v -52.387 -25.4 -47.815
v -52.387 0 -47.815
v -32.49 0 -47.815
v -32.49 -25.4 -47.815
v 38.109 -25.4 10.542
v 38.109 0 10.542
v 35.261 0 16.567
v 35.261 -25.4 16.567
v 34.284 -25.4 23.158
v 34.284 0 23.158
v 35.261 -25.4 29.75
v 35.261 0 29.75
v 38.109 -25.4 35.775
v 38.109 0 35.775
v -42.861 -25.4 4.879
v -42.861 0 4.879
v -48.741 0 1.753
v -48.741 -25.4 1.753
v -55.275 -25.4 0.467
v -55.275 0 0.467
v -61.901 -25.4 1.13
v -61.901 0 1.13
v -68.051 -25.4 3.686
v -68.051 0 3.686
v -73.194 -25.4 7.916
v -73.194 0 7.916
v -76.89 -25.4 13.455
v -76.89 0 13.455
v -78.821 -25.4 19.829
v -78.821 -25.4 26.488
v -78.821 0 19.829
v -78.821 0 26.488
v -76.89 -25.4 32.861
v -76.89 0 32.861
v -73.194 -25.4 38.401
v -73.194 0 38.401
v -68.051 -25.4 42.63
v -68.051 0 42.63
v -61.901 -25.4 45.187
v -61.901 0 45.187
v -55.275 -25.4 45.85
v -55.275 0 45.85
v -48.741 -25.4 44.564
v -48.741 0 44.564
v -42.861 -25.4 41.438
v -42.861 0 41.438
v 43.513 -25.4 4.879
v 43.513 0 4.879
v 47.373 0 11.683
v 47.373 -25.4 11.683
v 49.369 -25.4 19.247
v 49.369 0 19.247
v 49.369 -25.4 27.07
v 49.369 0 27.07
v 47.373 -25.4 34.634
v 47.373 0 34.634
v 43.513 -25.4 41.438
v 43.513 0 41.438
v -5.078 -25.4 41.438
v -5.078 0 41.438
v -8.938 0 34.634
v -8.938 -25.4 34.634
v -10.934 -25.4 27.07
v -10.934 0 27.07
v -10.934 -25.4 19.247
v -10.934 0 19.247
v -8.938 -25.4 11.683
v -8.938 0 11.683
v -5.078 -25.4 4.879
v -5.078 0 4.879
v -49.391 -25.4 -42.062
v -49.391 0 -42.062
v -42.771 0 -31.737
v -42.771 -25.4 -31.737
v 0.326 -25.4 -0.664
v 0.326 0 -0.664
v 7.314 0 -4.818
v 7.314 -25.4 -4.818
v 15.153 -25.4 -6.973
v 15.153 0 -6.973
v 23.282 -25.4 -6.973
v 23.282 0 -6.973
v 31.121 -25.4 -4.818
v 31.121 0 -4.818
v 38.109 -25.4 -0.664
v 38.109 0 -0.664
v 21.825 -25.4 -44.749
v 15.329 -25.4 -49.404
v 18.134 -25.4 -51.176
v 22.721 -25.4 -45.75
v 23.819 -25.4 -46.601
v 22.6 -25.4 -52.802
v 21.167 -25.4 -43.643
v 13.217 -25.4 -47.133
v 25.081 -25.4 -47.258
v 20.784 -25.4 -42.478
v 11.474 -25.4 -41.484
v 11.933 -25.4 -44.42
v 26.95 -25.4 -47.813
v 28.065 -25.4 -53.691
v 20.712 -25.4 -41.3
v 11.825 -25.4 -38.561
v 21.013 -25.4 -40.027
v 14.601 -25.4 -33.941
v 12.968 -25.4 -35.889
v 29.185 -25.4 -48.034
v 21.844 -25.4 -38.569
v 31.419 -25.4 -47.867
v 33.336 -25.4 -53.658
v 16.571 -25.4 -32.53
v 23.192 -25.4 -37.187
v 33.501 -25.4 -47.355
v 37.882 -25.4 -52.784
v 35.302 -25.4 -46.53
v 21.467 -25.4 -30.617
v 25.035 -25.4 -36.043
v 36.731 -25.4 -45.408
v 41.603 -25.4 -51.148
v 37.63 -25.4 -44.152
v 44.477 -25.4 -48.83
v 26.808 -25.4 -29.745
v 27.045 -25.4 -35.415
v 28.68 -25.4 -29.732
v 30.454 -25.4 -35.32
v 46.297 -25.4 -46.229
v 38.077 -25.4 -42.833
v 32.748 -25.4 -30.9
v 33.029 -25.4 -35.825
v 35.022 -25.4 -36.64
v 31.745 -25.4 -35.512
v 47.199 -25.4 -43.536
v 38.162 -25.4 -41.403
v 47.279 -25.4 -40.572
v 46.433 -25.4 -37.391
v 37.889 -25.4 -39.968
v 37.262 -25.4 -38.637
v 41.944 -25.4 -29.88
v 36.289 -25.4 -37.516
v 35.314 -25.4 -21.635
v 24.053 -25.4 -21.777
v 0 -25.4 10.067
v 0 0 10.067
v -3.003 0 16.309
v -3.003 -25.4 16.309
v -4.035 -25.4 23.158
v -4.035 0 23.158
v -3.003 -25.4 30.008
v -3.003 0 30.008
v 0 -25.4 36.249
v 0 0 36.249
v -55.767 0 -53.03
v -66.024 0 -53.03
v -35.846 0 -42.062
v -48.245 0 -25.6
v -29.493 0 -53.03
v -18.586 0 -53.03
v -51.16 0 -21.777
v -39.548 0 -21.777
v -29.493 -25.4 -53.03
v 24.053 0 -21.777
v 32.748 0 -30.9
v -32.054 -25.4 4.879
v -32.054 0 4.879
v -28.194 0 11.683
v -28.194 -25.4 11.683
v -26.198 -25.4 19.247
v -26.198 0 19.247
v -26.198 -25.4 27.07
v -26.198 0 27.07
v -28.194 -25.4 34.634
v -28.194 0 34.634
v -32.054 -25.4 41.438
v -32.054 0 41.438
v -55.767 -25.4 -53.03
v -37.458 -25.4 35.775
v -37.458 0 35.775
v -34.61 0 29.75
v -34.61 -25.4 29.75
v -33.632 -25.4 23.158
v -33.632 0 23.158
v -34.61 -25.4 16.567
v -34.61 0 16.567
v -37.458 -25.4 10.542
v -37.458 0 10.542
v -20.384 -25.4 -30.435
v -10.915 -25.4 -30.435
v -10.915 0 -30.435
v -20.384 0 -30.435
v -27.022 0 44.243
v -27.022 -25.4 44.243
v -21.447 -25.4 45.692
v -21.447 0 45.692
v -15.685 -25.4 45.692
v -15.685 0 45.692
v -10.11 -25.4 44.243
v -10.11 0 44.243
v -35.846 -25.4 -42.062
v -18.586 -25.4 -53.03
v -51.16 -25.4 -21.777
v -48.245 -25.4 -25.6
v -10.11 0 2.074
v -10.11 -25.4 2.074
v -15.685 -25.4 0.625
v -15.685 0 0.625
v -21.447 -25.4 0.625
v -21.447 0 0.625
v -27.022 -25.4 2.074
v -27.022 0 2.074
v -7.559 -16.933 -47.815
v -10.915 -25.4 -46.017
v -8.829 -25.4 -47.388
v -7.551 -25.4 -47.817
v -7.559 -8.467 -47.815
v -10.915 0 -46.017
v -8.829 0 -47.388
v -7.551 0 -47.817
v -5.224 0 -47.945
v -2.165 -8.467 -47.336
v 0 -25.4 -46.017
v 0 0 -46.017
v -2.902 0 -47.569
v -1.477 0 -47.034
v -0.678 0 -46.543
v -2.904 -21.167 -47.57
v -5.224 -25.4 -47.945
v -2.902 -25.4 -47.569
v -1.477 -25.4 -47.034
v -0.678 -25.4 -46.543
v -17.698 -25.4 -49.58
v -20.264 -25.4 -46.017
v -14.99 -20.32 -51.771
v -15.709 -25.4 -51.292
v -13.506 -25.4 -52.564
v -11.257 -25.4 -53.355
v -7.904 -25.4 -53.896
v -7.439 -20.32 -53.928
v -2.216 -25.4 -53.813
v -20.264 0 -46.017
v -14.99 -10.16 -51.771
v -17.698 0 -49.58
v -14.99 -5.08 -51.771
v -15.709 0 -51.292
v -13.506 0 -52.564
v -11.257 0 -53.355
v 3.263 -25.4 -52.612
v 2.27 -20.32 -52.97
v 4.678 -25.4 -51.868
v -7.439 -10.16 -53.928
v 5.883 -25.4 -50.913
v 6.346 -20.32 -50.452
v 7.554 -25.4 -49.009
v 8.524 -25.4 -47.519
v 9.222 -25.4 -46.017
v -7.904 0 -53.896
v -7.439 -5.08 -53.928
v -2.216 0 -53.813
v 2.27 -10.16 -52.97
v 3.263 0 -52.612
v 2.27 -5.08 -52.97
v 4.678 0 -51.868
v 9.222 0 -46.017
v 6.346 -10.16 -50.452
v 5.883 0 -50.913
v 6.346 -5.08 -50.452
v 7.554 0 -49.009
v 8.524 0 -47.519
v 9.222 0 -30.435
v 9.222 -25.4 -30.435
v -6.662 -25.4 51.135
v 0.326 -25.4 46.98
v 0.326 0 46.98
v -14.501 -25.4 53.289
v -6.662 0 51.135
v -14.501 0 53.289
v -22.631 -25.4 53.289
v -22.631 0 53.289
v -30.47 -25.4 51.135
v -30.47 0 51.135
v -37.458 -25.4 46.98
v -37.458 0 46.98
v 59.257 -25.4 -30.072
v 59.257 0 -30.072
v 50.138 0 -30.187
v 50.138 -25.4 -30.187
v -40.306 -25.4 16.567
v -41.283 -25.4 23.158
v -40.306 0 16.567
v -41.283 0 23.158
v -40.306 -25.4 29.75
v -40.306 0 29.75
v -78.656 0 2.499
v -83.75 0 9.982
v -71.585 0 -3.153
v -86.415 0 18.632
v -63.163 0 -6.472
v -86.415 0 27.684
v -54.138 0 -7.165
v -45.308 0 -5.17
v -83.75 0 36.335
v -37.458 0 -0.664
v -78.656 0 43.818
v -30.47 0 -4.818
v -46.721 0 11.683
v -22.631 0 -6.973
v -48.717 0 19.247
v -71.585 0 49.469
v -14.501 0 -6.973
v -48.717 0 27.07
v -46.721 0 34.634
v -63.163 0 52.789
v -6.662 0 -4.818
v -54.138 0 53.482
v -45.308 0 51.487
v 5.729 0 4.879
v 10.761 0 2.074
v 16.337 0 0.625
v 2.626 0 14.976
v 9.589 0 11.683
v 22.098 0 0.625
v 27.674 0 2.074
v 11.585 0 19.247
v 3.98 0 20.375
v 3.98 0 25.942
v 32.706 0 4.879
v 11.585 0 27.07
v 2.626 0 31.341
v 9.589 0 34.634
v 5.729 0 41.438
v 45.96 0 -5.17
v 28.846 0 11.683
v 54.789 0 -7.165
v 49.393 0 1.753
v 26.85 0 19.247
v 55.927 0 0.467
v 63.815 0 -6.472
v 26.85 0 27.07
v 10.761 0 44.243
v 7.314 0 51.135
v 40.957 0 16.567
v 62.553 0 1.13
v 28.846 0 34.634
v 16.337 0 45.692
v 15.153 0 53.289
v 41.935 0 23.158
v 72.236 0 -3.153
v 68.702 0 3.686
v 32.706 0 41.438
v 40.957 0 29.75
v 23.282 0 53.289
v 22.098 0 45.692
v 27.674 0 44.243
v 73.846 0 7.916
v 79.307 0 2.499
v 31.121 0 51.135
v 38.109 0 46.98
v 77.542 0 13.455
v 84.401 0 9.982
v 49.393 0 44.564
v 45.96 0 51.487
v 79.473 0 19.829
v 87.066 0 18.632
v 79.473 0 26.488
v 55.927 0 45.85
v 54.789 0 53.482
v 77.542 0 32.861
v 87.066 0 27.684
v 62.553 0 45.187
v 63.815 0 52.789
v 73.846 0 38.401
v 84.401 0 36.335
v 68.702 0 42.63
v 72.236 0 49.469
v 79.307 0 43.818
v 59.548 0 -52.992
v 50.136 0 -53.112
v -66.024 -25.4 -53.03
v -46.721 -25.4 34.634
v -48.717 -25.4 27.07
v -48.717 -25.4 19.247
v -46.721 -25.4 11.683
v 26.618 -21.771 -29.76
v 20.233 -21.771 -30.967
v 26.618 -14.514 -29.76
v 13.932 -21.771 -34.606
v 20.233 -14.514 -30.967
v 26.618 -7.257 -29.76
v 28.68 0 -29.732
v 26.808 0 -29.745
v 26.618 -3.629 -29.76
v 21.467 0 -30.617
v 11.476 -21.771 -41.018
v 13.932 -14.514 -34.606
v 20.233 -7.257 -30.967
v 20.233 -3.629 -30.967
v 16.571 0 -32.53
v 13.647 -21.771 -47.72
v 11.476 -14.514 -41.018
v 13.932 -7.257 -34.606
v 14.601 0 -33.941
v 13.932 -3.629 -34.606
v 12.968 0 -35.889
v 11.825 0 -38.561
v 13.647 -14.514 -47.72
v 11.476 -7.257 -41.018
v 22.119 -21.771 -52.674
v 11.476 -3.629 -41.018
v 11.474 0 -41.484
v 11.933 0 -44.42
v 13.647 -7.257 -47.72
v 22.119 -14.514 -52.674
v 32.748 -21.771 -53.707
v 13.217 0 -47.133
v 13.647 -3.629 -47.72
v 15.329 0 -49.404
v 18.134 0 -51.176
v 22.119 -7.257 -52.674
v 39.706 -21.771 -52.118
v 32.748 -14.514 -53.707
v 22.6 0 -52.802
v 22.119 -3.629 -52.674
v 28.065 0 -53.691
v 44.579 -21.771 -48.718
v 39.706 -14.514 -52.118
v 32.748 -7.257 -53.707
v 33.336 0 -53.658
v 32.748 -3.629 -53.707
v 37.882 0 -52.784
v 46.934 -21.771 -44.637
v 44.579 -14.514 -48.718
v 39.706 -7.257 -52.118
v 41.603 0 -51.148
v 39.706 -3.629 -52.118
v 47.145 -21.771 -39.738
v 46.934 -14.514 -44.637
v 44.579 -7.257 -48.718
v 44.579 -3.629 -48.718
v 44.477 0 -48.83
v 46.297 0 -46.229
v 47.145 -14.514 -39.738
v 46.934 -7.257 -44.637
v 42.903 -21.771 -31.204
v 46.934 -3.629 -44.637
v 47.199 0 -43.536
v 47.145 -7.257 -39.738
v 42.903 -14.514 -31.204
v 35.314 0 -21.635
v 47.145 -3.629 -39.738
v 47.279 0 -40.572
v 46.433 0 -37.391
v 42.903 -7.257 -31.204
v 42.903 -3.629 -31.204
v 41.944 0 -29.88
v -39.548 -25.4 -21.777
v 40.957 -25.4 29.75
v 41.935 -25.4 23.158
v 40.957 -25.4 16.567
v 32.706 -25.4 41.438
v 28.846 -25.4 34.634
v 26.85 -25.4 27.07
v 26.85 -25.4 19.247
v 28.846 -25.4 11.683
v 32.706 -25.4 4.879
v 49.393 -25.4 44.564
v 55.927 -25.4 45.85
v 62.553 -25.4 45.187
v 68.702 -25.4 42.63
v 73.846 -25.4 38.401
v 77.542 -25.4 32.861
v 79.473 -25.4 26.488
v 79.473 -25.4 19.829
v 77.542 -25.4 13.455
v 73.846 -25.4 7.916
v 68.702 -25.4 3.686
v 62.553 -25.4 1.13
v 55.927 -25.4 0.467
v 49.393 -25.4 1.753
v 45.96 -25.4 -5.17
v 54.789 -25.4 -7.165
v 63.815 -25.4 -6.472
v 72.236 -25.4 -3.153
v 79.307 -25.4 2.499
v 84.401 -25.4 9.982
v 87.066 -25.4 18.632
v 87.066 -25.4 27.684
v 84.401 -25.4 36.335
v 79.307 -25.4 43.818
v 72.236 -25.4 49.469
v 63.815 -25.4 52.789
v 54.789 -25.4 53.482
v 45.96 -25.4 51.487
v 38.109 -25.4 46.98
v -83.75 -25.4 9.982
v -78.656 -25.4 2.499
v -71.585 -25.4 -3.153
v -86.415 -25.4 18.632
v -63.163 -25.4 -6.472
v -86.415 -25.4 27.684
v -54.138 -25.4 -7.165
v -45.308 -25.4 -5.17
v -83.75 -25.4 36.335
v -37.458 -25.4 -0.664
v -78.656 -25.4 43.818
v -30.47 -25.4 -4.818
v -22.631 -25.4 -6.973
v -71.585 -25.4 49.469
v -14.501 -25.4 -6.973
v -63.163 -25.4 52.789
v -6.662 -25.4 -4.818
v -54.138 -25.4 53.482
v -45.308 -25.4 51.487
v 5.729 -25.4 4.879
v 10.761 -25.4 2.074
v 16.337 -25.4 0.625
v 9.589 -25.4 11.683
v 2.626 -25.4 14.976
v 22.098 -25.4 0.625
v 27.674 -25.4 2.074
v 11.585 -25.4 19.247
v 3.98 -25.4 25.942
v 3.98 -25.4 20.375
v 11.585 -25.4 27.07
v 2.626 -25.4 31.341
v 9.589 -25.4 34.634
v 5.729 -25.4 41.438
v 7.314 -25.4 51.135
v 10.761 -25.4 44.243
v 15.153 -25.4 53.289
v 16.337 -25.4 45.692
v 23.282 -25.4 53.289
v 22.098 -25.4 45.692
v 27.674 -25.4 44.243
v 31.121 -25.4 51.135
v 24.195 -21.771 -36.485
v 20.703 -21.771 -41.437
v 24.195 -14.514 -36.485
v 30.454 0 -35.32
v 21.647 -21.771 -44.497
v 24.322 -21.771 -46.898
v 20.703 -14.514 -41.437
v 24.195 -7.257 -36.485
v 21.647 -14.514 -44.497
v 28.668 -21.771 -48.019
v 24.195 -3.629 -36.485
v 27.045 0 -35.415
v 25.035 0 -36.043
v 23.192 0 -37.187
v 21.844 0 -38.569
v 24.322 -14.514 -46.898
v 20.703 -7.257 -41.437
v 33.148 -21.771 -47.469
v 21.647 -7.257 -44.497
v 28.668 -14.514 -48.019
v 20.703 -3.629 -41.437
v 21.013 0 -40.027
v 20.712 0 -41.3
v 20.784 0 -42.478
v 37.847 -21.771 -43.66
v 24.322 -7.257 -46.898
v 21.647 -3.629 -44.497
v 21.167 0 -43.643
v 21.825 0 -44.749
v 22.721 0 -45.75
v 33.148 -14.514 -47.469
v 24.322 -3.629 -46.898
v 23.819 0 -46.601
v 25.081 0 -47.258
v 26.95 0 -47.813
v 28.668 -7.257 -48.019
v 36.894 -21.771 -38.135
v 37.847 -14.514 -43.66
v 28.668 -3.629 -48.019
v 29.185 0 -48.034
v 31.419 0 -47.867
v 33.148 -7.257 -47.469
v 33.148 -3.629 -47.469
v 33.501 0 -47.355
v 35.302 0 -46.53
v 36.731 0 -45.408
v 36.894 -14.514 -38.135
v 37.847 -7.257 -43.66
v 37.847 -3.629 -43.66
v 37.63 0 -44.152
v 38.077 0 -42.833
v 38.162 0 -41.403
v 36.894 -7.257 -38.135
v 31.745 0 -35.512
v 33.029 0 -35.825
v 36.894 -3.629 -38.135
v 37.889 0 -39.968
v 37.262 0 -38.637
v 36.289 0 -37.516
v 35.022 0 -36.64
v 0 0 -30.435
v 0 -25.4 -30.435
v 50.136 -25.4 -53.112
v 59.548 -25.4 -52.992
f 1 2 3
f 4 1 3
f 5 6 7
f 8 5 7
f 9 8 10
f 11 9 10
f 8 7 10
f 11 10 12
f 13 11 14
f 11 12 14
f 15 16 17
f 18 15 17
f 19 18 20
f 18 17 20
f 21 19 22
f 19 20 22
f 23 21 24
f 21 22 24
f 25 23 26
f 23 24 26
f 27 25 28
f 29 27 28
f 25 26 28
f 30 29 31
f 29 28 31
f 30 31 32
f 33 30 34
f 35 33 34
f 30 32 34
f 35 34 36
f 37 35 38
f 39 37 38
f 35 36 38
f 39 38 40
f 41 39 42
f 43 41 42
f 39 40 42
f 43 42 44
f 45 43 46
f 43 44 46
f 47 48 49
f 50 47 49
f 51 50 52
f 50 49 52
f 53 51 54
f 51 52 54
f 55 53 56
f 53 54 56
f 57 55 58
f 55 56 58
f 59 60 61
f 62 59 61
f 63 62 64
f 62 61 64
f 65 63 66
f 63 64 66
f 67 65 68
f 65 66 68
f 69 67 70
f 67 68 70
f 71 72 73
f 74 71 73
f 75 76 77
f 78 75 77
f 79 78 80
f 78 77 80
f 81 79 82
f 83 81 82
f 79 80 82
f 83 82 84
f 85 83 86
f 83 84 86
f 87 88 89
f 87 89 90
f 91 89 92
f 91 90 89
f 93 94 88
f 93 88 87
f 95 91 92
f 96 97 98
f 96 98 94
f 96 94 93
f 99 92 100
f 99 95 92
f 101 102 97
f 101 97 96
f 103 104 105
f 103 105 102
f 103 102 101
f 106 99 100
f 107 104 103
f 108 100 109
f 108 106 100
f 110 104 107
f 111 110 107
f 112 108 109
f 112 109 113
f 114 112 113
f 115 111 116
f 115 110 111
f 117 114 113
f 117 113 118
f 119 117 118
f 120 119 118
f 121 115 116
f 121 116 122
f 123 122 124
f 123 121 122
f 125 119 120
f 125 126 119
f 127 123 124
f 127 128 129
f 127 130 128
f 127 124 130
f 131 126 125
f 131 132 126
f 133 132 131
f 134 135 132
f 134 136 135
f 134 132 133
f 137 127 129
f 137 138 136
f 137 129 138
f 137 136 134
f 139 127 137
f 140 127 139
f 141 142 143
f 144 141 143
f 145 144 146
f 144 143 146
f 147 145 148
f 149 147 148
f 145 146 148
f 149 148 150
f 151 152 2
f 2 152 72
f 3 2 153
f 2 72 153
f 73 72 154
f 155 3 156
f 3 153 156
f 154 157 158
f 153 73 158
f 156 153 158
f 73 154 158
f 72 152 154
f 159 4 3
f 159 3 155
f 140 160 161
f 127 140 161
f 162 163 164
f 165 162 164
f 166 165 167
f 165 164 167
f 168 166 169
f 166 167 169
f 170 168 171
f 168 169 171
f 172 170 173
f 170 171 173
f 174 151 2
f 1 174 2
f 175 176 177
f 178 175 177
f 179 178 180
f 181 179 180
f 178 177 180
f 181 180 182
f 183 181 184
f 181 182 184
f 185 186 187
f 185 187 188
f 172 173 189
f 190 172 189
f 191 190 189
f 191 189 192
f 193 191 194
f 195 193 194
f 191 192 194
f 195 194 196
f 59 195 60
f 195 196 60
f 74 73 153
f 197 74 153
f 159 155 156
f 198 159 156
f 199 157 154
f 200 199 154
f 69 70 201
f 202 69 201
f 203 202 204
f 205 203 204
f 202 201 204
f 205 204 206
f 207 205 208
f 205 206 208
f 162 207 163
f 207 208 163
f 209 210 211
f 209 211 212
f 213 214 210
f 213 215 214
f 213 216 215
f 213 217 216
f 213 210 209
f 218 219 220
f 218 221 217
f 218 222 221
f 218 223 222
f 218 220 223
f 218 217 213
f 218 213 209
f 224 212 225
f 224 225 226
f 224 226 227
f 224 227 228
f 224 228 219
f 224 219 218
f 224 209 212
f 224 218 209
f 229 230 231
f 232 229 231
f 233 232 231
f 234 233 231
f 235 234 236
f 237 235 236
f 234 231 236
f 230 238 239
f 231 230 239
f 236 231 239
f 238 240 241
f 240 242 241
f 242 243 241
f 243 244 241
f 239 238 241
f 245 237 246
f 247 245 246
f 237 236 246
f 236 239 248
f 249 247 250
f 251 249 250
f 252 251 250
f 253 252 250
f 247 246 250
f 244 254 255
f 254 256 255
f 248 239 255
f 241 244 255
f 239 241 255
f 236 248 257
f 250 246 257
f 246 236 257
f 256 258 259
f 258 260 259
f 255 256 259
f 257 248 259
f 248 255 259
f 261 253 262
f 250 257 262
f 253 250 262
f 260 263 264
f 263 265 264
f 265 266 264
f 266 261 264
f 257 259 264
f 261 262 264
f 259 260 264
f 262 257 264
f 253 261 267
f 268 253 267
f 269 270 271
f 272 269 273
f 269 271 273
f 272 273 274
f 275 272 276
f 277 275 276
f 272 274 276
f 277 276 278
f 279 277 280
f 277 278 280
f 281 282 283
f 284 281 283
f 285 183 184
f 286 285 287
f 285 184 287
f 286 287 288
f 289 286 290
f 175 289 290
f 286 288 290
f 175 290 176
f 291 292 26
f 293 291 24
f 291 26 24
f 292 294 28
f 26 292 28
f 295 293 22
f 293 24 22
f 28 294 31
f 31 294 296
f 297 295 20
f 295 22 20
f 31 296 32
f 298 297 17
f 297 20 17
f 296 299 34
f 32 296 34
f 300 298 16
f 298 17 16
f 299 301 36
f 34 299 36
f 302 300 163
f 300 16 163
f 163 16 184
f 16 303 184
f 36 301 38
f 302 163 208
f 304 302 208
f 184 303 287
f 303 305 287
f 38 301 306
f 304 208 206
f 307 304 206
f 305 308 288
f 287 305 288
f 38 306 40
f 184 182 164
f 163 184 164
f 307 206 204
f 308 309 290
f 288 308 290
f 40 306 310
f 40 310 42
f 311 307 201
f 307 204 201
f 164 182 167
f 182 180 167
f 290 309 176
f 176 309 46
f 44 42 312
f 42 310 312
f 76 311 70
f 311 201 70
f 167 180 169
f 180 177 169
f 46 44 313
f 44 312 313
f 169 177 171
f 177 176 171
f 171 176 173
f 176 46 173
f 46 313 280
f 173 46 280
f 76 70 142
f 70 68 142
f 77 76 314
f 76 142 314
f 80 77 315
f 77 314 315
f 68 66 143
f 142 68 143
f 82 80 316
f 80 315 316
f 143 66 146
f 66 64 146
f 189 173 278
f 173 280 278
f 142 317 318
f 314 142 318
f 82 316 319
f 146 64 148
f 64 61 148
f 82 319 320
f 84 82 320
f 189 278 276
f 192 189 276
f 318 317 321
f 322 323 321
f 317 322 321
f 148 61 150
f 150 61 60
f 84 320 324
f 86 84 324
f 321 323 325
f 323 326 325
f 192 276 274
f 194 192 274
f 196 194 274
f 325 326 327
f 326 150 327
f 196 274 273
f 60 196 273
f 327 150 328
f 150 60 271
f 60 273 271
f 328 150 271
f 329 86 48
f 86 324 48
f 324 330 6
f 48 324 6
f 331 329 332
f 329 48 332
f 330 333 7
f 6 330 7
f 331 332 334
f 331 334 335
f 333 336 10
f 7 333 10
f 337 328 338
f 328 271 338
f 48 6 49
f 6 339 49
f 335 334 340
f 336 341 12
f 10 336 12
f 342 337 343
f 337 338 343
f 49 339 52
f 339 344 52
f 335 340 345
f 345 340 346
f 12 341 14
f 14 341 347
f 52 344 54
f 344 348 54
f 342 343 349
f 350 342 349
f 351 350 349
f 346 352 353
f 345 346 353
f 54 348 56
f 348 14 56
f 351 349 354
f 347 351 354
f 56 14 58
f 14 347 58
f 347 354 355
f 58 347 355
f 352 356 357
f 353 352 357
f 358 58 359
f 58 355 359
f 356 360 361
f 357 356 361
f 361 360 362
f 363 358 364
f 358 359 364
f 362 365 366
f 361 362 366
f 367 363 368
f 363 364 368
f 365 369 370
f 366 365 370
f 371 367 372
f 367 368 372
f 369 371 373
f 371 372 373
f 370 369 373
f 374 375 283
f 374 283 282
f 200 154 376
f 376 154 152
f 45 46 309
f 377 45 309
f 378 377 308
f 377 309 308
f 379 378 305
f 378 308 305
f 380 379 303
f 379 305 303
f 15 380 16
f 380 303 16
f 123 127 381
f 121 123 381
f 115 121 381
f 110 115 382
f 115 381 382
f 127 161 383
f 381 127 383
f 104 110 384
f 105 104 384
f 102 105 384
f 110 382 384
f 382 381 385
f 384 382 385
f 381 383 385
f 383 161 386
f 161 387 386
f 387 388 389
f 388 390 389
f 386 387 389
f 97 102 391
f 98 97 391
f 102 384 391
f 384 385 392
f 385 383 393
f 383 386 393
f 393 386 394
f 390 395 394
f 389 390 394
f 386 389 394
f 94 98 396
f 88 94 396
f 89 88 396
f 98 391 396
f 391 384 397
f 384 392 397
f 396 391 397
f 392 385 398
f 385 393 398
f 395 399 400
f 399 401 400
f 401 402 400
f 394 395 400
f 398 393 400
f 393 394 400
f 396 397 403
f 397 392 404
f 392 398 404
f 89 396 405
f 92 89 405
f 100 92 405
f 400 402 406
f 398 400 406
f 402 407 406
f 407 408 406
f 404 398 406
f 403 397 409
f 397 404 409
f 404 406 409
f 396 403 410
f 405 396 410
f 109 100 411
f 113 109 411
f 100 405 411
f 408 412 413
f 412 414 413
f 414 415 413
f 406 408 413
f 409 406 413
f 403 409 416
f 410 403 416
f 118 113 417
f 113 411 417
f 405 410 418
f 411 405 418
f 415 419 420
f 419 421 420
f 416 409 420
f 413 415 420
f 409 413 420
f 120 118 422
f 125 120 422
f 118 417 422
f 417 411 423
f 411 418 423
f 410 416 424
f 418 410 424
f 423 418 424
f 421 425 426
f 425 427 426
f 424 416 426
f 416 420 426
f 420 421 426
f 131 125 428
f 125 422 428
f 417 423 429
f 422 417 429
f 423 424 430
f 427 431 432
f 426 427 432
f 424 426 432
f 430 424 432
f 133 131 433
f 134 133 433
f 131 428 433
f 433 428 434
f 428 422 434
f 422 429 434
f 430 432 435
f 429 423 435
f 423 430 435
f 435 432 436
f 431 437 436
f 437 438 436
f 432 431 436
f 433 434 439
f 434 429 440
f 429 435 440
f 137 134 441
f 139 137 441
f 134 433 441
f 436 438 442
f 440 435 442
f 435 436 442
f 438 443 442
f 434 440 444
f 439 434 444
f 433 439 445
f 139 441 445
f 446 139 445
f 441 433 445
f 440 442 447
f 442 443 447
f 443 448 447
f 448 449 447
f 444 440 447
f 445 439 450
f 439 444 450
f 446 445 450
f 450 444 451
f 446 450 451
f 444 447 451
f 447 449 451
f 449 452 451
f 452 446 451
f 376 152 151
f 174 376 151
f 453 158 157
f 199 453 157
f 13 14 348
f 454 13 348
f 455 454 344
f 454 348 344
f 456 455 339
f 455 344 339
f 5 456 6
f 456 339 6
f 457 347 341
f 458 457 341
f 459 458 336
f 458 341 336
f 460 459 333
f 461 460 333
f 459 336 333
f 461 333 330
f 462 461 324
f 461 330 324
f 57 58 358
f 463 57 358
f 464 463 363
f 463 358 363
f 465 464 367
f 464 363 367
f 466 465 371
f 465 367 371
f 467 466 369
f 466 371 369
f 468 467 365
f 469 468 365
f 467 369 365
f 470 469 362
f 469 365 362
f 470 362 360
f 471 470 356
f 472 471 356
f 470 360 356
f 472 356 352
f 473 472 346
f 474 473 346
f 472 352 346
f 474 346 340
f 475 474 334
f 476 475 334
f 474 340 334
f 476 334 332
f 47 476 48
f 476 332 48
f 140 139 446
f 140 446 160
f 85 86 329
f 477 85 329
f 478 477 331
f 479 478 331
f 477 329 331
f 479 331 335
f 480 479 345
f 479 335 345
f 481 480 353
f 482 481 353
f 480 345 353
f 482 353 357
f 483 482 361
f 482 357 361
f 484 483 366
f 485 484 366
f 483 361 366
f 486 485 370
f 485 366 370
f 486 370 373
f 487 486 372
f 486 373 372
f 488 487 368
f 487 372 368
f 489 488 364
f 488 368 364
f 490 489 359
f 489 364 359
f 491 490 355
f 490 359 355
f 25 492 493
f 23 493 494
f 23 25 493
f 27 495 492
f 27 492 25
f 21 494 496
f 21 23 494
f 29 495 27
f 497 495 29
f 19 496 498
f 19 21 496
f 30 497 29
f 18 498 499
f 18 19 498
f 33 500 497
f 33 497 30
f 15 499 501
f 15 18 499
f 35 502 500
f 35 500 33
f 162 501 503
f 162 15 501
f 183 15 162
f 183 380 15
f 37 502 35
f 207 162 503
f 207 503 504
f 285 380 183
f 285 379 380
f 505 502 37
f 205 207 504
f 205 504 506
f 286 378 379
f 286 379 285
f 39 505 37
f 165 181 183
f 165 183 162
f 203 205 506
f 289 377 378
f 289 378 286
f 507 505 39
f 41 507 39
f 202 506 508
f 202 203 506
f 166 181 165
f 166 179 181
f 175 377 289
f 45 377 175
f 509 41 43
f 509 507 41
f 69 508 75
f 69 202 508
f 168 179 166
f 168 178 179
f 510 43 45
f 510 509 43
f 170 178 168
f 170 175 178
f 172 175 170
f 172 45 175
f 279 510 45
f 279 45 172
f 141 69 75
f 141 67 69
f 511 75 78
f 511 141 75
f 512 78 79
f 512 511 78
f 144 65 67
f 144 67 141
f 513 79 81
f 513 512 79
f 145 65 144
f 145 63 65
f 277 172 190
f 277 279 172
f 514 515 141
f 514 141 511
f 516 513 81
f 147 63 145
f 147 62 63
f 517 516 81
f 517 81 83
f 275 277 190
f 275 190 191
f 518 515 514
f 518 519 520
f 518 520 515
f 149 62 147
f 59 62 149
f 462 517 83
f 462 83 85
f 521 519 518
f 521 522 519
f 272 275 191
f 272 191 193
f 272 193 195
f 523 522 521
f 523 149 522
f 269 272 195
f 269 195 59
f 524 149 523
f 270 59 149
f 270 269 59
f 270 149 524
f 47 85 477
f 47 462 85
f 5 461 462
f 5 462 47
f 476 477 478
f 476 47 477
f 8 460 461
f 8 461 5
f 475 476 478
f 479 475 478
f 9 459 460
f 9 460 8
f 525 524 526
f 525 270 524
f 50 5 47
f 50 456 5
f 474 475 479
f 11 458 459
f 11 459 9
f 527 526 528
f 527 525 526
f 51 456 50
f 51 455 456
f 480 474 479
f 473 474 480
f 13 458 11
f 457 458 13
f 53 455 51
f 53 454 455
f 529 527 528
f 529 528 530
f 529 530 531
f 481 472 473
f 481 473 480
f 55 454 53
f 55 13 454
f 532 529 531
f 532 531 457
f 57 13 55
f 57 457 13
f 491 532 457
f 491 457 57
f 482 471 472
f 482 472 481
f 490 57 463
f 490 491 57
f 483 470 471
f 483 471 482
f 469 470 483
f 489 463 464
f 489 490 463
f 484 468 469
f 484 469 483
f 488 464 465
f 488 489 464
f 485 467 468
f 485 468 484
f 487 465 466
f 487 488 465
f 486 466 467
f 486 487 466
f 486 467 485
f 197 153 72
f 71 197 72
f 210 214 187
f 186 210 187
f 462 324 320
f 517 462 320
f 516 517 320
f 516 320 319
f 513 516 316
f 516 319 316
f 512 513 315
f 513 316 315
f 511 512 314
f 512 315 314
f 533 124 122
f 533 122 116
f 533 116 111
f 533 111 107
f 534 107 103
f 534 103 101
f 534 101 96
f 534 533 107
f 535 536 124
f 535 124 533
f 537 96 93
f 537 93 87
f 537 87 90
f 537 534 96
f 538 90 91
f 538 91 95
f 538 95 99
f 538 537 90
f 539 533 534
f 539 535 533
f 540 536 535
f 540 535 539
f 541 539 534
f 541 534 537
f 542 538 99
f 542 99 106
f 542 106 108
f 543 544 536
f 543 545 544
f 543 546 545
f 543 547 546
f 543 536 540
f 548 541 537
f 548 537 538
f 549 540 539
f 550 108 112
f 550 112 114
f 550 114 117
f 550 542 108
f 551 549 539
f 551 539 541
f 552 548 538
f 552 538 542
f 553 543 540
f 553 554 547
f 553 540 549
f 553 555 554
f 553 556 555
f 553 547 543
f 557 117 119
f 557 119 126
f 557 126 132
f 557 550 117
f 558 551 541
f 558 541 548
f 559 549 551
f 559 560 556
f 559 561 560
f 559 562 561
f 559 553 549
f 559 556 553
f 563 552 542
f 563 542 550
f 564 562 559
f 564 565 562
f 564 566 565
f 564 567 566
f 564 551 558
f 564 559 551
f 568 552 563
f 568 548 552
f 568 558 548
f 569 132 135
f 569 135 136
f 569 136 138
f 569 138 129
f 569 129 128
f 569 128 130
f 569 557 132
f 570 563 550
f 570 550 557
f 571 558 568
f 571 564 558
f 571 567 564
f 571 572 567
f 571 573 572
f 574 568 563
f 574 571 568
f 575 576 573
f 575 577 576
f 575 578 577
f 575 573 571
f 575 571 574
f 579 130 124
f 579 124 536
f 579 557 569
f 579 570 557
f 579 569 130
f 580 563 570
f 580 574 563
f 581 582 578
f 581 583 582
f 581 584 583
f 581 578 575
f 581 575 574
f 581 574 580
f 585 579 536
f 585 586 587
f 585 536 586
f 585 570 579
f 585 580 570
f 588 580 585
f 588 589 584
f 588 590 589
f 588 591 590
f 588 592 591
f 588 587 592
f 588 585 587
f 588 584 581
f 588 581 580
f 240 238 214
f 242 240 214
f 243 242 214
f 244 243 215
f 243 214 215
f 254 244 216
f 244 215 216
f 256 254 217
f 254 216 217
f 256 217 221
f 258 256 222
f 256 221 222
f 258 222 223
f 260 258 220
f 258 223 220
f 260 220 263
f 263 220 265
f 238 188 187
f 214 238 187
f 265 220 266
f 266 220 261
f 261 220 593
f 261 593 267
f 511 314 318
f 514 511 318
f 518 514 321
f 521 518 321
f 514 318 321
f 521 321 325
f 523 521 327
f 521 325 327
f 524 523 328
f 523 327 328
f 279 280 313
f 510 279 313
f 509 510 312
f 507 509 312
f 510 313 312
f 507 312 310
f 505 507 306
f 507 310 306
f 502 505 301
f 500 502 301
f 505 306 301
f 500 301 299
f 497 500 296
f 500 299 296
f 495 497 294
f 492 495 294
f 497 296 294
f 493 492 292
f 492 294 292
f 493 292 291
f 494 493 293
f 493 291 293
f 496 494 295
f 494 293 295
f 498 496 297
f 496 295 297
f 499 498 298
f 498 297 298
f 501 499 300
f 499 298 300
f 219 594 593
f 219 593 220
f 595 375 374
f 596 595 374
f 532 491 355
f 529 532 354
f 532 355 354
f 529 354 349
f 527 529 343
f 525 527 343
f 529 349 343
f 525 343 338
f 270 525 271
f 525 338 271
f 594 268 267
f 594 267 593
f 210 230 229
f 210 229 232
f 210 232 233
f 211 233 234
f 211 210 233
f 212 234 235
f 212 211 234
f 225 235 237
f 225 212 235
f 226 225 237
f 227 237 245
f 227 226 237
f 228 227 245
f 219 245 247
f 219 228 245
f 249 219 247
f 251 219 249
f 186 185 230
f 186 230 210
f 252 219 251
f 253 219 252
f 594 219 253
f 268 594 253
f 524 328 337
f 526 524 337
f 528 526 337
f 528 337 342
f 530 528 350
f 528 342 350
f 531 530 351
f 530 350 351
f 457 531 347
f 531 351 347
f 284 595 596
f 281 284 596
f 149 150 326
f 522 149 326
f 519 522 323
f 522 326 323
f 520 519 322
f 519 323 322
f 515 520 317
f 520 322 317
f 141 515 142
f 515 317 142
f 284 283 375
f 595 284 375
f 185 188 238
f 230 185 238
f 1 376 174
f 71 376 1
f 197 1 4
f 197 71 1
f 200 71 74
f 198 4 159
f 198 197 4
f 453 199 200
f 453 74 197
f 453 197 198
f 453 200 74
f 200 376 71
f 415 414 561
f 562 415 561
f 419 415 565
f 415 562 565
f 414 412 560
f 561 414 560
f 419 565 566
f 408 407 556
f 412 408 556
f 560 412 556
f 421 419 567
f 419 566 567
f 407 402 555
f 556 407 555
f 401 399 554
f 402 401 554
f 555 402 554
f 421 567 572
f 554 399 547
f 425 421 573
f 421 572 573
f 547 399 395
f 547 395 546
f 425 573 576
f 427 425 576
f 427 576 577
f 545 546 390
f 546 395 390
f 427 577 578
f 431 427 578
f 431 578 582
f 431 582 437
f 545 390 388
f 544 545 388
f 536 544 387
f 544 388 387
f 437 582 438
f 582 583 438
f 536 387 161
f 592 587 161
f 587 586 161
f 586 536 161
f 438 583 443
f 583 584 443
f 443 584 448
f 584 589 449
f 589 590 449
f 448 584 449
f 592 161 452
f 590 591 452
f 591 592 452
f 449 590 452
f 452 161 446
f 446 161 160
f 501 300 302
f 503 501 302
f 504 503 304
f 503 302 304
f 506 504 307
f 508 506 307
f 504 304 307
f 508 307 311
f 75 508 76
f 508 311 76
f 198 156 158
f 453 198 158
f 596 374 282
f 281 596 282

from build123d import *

# Parameters (mm, degrees)
F1_DEPTH = 25.4


with BuildPart() as f1:
    # F0 (on Front) → F1 (new body)
    with BuildSketch(Plane.XZ):
        with BuildLine():
            ThreePointArc((0.3257377115, 46.9804664932), (-18.5660072885, 53.5621488049), (-37.4577522885, 46.9804664932))
            ThreePointArc((-37.4577522885, 46.9804664932), (-86.7533174857, 23.1583286077), (-37.4577522885, -0.6638092779))
            ThreePointArc((-37.4577522885, -0.6638092779), (-18.5660072885, -7.2454915895), (0.3257377115, -0.6638092779))
            ThreePointArc((0.3257377115, -0.6638092779), (19.2174827115, -7.2454915895), (38.1092277115, -0.6638092779))
            ThreePointArc((38.1092277115, -0.6638092779), (87.4047929087, 23.1583286077), (38.1092277115, 46.9804664932))
            ThreePointArc((38.1092277115, 46.9804664932), (19.2174827115, 53.5621488049), (0.3257377115, 46.9804664932))
        make_face()
        with BuildLine():
            ThreePointArc((-42.8612110868, 4.8789589528), (-79.0666542328, 23.1583286077), (-42.8612110868, 41.4376982625))
            ThreePointArc((-42.8612110868, 41.4376982625), (-48.9698274857, 23.1583286077), (-42.8612110868, 4.8789589528))
        make_face(mode=Mode.SUBTRACT)
        with BuildLine():
            ThreePointArc((-37.4577522885, 10.5420220764), (-41.2831642328, 23.1583286077), (-37.4577522885, 35.7746351389))
            ThreePointArc((-37.4577522885, 35.7746351389), (-33.6323403441, 23.1583286077), (-37.4577522885, 10.5420220764))
        make_face(mode=Mode.SUBTRACT)
        with BuildLine():
            ThreePointArc((-32.0542934901, 41.4376982625), (-18.5660072885, 45.875485552), (-5.0777210868, 41.4376982625))
            ThreePointArc((-5.0777210868, 41.4376982625), (-11.1863374857, 23.1583286077), (-5.0777210868, 4.8789589528))
            ThreePointArc((-5.0777210868, 4.8789589528), (-18.5660072885, 0.4411716633), (-32.0542934901, 4.8789589528))
            ThreePointArc((-32.0542934901, 4.8789589528), (-25.9456770913, 23.1583286077), (-32.0542934901, 41.4376982625))
        make_face(mode=Mode.SUBTRACT)
        with BuildLine():
            ThreePointArc((0, 36.2492641357), (4.1511496559, 23.1583286077), (0, 10.0673930796))
            ThreePointArc((0, 10.0673930796), (-4.0351350931, 23.1583286077), (0, 36.2492641357))
        make_face(mode=Mode.SUBTRACT)
        with BuildLine():
            ThreePointArc((5.7291965099, 41.4376982625), (19.2174827115, 45.875485552), (32.7057689132, 41.4376982625))
            ThreePointArc((32.7057689132, 41.4376982625), (26.5971525143, 23.1583286077), (32.7057689132, 4.8789589528))
            ThreePointArc((32.7057689132, 4.8789589528), (19.2174827115, 0.4411716633), (5.7291965099, 4.8789589528))
            ThreePointArc((5.7291965099, 4.8789589528), (11.8378129087, 23.1583286077), (5.7291965099, 41.4376982625))
        make_face(mode=Mode.SUBTRACT)
        with BuildLine():
            ThreePointArc((38.1092277115, 10.5420220764), (34.2838157672, 23.1583286077), (38.1092277115, 35.7746351389))
            ThreePointArc((38.1092277115, 35.7746351389), (41.9346396559, 23.1583286077), (38.1092277115, 10.5420220764))
        make_face(mode=Mode.SUBTRACT)
        with BuildLine():
            ThreePointArc((43.5126865099, 41.4376982625), (79.7181296559, 23.1583286077), (43.5126865099, 4.8789589528))
            ThreePointArc((43.5126865099, 4.8789589528), (49.6213029087, 23.1583286077), (43.5126865099, 41.4376982625))
        make_face(mode=Mode.SUBTRACT)
    extrude(amount=F1_DEPTH)


with BuildPart() as f1b:
    # F0 (on Front) → F1, piece 2 (new body)
    with BuildSketch(Plane.XZ):
        Polygon((-48.2449345291, -25.6000366062), (-66.0236254334, -53.0300103128), (-55.7671576112, -53.0300103128), (-52.3873344064, -47.8154271841), (-32.4900448322, -47.8154271841), (-29.4934660196, -53.0300103128), (-18.5859147459, -53.0300103128), (-39.5482927561, -21.7774584889), (-51.1598773301, -21.7774584889), align=None)
        Polygon((-35.8462147415, -42.0619919896), (-49.3907555938, -42.0619919896), (-42.7714564835, -31.7372341625), align=None, mode=Mode.SUBTRACT)
    extrude(amount=F1_DEPTH)


with BuildPart() as f1c:
    # F0 (on Front) → F1, piece 3 (new body)
    with BuildSketch(Plane.XZ):
        with BuildLine():
            Line((-10.9146703035, -30.4352641106), (-20.3838627785, -30.4352641106))
            Line((-20.3838627785, -30.4352641106), (-20.2639997005, -46.0174791515))
            add(Edge.make_bspline(
                [(-20.2639997005, -46.0174791515), (-19.078476388, -48.3510011859), (-15.2422867149, -52.4994844607), (-7.6505096386, -54.4486724465), (2.4232218284, -53.5168061714), (6.4286154935, -50.8196755354), (8.6860112316, -47.5204543574), (9.222346358, -46.0174791515)],
                knots=[0, 0, 0, 0, 0.2115271615, 0.4237122791, 0.6602068488, 0.825917741, 1, 1, 1, 1], degree=3))
            Line((9.222346358, -46.0174791515), (9.222346358, -30.4352641106))
            Line((9.222346358, -30.4352641106), (0, -30.4352641106))
            Line((0, -30.4352641106), (0, -46.0174791515))
            add(Edge.make_bspline(
                [(-10.9146703035, -46.0174791515), (-9.9383207167, -46.7689096849), (-7.7975948287, -48.4164822528), (-2.0428292679, -47.6669488752), (-0.5901281845, -46.4939744655), (0, -46.0174791515)],
                knots=[0, 0, 0, 0, 0.3323932812, 0.7287993067, 1, 1, 1, 1], degree=3))
            Line((-10.9146703035, -46.0174791515), (-10.9146703035, -30.4352641106))
        make_face()
    extrude(amount=F1_DEPTH)


with BuildPart() as f1d:
    # F0 (on Front) → F1, piece 4 (new body)
    with BuildSketch(Plane.XZ):
        with BuildLine():
            Line((24.052741006, -21.7774640769), (32.7478125691, -30.900163576))
            add(Edge.make_bspline(
                [(32.7478125691, -30.900163576), (29.7426497286, -29.7553391025), (27.5330072276, -29.3114611204), (11.0097216276, -32.1368400019), (10.3567760076, -51.0689860547), (33.0869741502, -55.5707344255), (45.4438933537, -49.9808832635), (49.5245949416, -38.4775955078), (40.8401708539, -28.3088108065), (35.3135690093, -21.6349232942)],
                knots=[0, 0, 0, 0, 0.0976588054, 0.2417933981, 0.3834470786, 0.5584355319, 0.6985849896, 0.8181138879, 1, 1, 1, 1], degree=3))
            Line((35.3135690093, -21.6349232942), (24.052741006, -21.7774640769))
        make_face()
        with BuildLine():
            add(Edge.make_bspline(
                [(30.4536372423, -35.3195555508), (28.1638773212, -35.0780844827), (24.0002699023, -35.6530041008), (19.1534906663, -41.3936427557), (23.8659539627, -48.2586824853), (33.3069252679, -48.3362956842), (38.8479249763, -44.2326893943), (37.7957037247, -37.1666525845), (32.8597627783, -35.5732981803), (30.4536372423, -35.3195555508)],
                knots=[0, 0, 0, 0, 0.1401966738, 0.2769844468, 0.419206197, 0.5844560915, 0.7211198069, 0.8526785303, 1, 1, 1, 1], degree=3))
        make_face(mode=Mode.SUBTRACT)
    extrude(amount=F1_DEPTH)


with BuildPart() as f1e:
    # F0 (on Front) → F1, piece 5 (new body)
    with BuildSketch(Plane.XZ):
        Polygon((59.2573859635, -30.0720174742), (50.1379556954, -30.187452212), (50.1358319434, -53.1115063966), (59.5475143018, -52.9923723001), align=None)
    extrude(amount=F1_DEPTH)


solid = Compound([f1.part, f1b.part, f1c.part, f1d.part, f1e.part])
